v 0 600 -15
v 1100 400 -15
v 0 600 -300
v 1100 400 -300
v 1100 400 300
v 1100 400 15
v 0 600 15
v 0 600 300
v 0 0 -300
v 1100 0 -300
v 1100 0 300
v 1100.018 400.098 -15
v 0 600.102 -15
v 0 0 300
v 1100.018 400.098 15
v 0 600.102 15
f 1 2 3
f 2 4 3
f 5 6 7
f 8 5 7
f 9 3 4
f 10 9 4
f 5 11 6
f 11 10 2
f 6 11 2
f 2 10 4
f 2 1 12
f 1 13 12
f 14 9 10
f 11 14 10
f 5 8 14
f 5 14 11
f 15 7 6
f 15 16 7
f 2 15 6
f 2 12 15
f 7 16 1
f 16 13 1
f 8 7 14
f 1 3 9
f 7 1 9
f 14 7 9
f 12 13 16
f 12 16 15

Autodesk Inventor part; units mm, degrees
ref_plane "YZ Plane" through (0, 0, 0) normal (1, 0, 0) x (0, 1, 0)
ref_plane "XZ Plane" through (0, 0, 0) normal (0, 1, 0) x (-1, 0, 0)
ref_plane "XY Plane" through (0, 0, 0) normal (0, 0, 1) x (1, 0, 0)
sketch "スケッチ1" plane through (0, 0, 0) normal (0, 0, 1) x (1, 0, 0)
  line L0 (0, 0) -> (1100, 0)
  line L1 (1100, 0) -> (1100, 400)
  line L2 (1100, 400) -> (0, 600)
  line L3 (0, 600) -> (0, 0)
  dimension "d0" = 600
  dimension "d1" = 1100
  dimension "d2" = 400
extrude "押し出し1" add sketch "スケッチ1" along normal mid plane 600
sketch "スケッチ2" plane through (0, 0, 0) normal (0, 0, 1) x (1, 0, 0)
  line L0 (1100, 400) -> (0, 600) projected
  line L1 (0, 600) -> (0, 600.1016)
  line L2 (0, 600.1016) -> (1100.0179, 400.0984)
  line L3 (1100.0179, 400.0984) -> (1100, 400)
  point P0 (0, 0)
  dimension "d5" = 0.1
extrude "押し出し2" add sketch "スケッチ2" along normal mid plane 30
properties part number "Slope 3"
